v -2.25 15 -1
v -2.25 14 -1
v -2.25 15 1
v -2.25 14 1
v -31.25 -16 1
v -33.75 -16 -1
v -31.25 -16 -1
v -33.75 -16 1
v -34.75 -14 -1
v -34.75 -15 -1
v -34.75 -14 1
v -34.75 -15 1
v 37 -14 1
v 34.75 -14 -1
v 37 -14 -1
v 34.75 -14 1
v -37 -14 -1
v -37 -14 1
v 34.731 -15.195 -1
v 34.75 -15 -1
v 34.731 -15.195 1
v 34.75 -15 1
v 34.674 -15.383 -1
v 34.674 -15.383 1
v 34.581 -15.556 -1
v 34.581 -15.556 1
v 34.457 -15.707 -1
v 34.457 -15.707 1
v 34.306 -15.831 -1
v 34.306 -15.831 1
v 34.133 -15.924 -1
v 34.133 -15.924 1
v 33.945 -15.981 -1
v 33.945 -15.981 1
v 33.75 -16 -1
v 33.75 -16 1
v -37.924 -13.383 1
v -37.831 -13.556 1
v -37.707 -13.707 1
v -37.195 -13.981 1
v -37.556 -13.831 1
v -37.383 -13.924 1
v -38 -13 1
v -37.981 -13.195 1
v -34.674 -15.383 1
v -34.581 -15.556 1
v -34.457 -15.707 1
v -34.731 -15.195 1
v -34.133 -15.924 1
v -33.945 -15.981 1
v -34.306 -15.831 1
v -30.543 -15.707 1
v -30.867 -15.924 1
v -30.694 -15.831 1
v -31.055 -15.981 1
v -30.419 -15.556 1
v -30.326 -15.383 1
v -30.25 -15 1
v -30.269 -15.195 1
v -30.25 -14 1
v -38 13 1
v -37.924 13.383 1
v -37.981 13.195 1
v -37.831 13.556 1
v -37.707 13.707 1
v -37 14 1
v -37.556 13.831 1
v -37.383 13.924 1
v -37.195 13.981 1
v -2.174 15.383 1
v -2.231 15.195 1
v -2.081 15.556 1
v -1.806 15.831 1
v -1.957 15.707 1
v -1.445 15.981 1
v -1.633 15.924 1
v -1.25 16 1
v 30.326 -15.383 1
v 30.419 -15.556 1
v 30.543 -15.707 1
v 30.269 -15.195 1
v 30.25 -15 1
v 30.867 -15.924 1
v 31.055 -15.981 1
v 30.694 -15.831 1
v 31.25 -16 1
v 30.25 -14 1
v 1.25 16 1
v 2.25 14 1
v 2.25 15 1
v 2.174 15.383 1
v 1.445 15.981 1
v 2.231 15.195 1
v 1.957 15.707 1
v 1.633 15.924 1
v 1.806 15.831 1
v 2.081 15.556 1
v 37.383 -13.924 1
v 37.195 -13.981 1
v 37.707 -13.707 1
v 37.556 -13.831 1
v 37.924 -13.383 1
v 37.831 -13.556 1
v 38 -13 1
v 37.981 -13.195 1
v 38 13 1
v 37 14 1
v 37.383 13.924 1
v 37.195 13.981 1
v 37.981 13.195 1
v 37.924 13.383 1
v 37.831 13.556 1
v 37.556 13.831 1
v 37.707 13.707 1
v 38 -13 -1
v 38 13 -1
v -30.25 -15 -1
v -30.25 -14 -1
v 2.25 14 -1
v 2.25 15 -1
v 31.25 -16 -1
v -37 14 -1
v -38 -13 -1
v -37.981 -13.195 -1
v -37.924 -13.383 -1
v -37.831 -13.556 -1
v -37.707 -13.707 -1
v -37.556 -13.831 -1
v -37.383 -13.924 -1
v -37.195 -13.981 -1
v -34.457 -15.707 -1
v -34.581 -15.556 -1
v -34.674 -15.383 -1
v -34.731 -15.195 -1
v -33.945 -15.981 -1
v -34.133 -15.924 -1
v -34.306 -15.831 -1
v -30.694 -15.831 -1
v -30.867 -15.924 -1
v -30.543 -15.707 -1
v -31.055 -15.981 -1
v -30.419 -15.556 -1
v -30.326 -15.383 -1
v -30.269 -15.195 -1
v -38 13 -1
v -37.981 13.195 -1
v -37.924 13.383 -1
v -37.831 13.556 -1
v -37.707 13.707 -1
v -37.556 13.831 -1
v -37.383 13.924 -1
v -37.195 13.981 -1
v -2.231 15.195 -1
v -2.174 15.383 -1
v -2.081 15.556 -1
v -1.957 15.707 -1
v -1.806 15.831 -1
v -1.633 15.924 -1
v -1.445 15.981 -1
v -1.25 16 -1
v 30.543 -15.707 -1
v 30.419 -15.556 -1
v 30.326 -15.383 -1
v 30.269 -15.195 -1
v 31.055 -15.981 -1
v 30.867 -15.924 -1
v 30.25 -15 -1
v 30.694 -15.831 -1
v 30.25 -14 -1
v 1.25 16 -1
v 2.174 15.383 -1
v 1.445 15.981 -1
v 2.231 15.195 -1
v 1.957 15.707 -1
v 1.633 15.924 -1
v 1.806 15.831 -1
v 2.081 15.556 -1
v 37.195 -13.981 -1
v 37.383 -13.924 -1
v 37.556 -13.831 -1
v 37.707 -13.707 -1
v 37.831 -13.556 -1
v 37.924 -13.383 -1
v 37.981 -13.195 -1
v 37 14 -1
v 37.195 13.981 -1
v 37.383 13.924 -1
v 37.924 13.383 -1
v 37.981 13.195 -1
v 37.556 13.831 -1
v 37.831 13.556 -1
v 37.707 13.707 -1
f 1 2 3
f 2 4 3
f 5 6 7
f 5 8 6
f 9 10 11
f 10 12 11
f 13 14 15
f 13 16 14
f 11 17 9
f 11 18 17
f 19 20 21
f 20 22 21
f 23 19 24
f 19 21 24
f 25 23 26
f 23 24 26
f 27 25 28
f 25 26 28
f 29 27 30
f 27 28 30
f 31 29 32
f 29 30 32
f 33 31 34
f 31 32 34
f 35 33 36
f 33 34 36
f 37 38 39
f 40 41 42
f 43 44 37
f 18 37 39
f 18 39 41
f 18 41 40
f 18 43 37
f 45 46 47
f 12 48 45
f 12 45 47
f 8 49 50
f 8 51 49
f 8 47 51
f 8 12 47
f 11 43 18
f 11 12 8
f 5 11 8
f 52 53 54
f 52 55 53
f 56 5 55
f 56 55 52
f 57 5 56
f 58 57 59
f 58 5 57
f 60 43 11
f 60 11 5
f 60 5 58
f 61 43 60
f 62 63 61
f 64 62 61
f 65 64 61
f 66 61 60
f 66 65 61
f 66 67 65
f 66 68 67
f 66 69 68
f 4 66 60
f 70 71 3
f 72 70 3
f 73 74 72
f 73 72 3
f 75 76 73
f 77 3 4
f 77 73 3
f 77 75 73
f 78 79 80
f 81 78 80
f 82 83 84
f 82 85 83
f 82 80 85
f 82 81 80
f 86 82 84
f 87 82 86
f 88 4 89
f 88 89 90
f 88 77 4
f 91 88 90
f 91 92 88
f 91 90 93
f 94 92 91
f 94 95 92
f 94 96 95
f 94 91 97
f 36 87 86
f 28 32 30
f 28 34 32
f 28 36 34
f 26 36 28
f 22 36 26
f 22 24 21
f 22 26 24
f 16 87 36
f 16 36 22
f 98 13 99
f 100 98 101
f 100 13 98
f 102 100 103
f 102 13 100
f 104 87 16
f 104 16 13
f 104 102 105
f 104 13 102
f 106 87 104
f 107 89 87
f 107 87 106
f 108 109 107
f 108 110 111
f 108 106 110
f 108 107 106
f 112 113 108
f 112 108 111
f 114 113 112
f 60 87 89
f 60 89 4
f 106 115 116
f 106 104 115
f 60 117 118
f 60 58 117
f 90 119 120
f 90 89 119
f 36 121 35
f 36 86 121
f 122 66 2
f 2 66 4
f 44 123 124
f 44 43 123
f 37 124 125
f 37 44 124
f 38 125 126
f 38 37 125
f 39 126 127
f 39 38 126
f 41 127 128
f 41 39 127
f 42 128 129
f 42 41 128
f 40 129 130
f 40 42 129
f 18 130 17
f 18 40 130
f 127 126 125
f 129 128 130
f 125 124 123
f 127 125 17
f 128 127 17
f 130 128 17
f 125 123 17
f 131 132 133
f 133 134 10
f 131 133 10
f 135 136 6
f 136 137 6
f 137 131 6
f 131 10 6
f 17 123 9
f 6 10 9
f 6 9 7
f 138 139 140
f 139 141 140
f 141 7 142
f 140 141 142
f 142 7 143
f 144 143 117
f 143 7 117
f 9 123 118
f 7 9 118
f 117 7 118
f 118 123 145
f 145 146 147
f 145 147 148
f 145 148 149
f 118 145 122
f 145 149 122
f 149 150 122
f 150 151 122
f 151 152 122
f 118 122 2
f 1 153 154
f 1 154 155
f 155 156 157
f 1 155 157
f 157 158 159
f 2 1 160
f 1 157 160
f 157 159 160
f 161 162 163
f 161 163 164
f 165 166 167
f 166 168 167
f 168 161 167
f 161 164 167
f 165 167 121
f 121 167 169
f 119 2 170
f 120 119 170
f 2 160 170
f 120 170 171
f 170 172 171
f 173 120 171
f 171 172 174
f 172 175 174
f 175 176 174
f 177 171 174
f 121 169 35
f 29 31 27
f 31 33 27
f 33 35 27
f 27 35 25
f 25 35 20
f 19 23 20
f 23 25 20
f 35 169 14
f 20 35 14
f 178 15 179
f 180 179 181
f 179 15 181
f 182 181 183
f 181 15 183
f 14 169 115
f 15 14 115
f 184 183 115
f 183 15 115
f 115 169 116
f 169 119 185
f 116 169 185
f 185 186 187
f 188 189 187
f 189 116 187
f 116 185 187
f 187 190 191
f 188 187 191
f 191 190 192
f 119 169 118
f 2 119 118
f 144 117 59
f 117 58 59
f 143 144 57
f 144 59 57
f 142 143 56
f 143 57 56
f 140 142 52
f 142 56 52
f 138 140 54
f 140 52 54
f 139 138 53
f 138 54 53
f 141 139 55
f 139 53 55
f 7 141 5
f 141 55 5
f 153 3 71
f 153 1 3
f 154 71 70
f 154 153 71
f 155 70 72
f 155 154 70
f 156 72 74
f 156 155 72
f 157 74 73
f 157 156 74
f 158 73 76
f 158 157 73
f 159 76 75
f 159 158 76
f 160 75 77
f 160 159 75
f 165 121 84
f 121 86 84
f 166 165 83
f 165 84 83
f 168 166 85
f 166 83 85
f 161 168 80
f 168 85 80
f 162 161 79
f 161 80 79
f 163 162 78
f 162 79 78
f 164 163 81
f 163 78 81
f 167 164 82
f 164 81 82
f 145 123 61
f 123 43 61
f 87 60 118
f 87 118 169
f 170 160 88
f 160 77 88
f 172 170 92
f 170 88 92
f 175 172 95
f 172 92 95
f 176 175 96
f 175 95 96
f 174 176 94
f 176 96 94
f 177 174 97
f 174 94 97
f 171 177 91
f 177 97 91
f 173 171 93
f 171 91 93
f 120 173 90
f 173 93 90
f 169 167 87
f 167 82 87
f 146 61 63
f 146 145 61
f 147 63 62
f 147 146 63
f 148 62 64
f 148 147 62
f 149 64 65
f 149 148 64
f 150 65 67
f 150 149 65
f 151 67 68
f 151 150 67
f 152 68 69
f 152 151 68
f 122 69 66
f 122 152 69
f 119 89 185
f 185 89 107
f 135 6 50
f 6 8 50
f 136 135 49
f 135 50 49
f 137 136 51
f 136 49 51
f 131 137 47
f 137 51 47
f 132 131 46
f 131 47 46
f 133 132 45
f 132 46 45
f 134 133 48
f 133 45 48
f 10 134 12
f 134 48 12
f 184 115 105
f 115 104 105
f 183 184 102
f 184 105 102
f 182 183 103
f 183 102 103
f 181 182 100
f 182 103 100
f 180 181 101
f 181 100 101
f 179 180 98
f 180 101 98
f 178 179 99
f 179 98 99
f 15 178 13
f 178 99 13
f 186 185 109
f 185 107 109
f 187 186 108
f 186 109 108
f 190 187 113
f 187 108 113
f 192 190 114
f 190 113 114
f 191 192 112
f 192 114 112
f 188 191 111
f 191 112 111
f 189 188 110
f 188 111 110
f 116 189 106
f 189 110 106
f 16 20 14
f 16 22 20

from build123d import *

# Parameters (mm, degrees)
SKETCH1_W           = 76
SKETCH1_H           = 28
SKETCH1_W_2         = 4.5
SKETCH1_H_2         = 2
BOSS_EXTRUDE1_DEPTH = 1
FILLET1_R           = 1


with BuildPart() as part:
    # Sketch1 → Boss-Extrude1 (new, symmetric)
    with BuildSketch(Plane.XY):
        Rectangle(SKETCH1_W, SKETCH1_H)
        with Locations((-32.5, -15)):
            Rectangle(SKETCH1_W_2, SKETCH1_H_2)
        with Locations((32.5, -15)):
            Rectangle(SKETCH1_W_2, SKETCH1_H_2)
        with Locations((0, 15)):
            Rectangle(SKETCH1_W_2, SKETCH1_H_2)
    extrude(amount=BOSS_EXTRUDE1_DEPTH, both=True)

    # Fillet1
    fillet1_edges = [part.edges().sort_by_distance(p)[0] for p in [
        (38, -14, 0),
        (34.75, -16, 0),
        (30.25, -16, 0),
        (-30.25, -16, 0),
        (-34.75, -16, 0),
        (-38, -14, 0),
        (-38, 14, 0),
        (38, 14, 0),
        (2.25, 16, 0),
        (-2.25, 16, 0),
    ]]
    fillet(fillet1_edges, radius=FILLET1_R)


solid = part.part
